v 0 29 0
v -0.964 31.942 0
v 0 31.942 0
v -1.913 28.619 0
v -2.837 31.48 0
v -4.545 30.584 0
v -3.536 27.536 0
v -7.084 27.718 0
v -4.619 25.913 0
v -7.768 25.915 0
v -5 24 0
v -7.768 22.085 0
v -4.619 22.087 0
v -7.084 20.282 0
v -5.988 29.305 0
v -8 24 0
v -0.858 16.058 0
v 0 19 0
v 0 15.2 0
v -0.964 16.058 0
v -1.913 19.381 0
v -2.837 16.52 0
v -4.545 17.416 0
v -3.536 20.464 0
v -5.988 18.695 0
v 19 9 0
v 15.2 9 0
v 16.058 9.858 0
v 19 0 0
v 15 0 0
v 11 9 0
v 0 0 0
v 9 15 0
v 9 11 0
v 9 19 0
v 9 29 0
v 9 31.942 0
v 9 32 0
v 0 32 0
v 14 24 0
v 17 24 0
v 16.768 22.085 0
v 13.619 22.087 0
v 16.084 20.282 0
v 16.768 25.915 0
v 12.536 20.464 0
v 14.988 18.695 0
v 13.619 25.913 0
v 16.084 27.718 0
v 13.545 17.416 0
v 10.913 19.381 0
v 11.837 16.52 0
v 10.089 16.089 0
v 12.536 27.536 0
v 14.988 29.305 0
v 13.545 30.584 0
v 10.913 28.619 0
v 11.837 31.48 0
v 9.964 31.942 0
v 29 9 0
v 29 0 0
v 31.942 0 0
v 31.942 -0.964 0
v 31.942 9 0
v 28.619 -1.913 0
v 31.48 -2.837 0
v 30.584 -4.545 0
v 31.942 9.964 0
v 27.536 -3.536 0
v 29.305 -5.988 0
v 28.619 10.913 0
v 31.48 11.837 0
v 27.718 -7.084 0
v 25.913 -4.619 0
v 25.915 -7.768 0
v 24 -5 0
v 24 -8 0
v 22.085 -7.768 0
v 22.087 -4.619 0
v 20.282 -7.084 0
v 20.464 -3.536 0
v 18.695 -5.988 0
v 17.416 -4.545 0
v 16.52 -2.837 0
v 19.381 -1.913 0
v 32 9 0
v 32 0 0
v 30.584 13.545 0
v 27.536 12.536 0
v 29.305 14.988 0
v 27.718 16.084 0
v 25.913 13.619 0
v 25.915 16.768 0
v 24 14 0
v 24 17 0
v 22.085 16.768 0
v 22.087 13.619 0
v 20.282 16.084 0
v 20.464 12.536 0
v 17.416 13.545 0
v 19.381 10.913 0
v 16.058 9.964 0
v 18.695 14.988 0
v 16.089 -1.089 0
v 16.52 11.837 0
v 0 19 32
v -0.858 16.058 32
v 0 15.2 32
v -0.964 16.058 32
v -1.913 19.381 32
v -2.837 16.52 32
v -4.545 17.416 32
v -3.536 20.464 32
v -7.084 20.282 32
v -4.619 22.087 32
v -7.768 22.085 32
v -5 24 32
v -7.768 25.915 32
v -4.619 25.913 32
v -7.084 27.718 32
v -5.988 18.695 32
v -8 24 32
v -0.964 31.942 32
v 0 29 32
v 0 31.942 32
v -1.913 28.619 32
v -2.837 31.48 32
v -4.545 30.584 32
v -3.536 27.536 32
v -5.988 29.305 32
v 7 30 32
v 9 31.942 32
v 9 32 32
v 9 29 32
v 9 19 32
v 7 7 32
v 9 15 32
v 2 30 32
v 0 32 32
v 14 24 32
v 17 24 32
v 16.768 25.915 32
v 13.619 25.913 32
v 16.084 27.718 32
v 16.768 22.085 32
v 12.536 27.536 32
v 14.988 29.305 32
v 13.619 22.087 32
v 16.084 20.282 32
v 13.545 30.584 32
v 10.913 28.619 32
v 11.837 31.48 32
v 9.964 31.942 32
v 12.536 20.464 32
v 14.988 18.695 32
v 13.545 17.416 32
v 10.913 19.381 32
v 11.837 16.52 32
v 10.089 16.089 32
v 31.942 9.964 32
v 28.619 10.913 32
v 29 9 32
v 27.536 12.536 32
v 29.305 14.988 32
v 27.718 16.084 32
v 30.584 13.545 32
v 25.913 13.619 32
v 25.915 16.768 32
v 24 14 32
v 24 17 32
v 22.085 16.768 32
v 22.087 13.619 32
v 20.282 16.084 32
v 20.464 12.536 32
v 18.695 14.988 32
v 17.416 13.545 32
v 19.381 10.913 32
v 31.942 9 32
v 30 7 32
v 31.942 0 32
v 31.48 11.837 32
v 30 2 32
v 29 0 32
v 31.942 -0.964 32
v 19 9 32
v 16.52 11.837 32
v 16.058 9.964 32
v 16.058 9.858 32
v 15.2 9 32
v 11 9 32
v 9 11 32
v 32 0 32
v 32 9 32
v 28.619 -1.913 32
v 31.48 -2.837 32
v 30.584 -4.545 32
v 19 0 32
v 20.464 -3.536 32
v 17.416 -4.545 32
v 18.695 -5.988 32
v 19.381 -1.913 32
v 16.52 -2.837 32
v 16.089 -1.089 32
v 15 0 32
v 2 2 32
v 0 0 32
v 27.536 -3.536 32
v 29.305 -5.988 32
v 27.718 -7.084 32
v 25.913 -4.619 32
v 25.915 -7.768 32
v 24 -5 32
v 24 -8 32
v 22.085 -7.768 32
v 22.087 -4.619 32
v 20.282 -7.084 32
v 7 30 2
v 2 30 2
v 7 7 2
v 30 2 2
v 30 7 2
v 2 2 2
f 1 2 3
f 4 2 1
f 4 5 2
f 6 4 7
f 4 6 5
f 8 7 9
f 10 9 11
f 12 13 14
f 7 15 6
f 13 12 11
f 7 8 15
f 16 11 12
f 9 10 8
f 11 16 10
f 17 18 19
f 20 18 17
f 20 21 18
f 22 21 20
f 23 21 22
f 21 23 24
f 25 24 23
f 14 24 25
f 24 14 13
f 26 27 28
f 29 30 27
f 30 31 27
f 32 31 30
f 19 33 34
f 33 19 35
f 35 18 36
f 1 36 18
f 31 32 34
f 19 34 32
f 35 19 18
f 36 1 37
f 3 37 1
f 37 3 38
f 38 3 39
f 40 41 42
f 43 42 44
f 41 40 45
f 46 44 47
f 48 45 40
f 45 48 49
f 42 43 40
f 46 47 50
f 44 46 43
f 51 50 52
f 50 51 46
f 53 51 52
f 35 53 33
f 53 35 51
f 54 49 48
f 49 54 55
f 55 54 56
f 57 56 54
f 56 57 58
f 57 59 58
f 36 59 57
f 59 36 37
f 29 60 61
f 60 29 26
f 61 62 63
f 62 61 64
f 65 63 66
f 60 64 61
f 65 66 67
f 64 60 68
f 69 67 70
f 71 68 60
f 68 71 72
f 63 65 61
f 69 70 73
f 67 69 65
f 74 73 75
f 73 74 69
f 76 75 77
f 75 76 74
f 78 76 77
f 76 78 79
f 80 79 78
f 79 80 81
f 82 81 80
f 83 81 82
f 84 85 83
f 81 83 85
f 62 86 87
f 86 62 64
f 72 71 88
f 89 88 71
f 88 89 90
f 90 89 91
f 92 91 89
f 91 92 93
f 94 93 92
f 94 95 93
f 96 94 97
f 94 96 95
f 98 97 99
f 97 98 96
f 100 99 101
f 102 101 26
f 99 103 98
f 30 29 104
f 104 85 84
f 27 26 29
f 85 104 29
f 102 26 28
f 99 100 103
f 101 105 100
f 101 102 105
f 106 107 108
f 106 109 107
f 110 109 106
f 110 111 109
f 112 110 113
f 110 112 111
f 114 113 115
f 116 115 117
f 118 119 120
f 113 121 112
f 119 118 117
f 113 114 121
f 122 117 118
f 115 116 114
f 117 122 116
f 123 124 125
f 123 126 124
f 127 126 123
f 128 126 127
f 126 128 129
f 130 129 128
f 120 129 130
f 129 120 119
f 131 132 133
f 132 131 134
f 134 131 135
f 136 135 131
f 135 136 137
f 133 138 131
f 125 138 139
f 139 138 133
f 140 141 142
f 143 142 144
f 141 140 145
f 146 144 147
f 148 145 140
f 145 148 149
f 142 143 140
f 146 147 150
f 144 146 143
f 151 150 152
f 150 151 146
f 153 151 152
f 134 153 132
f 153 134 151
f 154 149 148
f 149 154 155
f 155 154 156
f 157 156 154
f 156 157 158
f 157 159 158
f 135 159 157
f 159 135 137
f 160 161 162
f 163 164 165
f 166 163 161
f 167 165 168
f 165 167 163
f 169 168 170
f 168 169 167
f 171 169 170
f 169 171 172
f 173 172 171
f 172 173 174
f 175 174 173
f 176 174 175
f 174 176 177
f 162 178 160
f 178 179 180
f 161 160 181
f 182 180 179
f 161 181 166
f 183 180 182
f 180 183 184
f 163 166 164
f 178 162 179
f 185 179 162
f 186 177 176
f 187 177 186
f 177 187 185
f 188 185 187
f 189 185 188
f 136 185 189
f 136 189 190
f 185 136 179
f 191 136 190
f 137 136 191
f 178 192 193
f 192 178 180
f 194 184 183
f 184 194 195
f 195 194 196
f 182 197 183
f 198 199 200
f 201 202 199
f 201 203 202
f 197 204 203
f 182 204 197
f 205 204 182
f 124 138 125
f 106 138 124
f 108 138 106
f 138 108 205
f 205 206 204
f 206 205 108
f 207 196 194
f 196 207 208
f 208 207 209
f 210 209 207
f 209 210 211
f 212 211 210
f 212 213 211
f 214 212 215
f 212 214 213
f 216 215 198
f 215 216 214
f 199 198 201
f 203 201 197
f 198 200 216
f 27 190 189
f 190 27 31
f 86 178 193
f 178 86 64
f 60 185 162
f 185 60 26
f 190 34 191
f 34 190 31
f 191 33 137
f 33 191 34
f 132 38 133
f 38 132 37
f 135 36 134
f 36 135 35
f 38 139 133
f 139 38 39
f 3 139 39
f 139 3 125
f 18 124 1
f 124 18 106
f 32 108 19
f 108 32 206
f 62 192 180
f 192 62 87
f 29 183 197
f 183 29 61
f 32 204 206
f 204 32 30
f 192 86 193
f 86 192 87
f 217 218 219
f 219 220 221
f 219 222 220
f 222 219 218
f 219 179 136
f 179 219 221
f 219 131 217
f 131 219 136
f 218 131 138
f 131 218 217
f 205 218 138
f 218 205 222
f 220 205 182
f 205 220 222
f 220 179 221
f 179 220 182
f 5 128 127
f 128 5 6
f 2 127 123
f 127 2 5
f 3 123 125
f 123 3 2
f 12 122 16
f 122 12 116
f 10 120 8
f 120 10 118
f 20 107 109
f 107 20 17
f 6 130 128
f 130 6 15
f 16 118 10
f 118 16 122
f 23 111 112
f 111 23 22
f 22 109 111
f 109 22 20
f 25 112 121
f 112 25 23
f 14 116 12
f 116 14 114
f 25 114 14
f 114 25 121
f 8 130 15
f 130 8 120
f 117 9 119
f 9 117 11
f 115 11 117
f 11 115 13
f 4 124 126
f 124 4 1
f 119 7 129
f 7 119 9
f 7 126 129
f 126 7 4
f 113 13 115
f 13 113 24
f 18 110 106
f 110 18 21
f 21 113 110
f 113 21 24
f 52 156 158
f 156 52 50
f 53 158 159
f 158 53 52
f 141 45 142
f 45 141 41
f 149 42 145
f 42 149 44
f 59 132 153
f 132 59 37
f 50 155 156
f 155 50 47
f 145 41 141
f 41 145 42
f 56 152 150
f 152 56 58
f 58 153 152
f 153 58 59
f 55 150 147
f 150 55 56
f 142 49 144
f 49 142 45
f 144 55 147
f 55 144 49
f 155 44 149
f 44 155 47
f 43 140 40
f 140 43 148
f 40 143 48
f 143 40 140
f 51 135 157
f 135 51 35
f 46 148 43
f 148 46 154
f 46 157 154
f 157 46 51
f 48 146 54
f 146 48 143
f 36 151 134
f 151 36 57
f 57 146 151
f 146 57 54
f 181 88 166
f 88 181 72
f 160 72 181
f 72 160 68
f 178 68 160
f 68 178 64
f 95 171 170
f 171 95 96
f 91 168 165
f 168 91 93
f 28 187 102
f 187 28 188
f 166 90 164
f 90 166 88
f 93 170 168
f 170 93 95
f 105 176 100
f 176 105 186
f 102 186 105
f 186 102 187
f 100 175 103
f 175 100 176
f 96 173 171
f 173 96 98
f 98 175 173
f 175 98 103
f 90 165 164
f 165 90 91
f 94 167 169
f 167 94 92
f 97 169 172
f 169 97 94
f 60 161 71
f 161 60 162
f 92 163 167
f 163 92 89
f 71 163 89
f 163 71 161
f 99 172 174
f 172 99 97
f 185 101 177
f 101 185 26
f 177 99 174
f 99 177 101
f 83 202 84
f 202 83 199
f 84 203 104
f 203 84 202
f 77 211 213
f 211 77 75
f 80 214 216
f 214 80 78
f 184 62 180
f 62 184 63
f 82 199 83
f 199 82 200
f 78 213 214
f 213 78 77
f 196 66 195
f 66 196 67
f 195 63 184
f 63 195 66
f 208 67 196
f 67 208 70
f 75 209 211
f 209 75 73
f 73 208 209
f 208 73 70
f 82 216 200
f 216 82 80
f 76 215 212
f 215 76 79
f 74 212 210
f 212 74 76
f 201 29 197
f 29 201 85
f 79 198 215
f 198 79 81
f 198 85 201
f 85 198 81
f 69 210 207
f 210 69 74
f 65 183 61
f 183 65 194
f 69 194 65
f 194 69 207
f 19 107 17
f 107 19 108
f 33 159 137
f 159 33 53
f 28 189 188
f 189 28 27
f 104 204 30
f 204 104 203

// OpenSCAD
// Copyright (c) 2015 Richard Hawkins
//
// Licensed under the Apache License, Version 2.0 (the "License");
// you may not use this file except in compliance with the License.
// You may obtain a copy of the License at
//
//    http://www.apache.org/licenses/LICENSE-2.0
//
// Unless required by applicable law or agreed to in writing, software
// distributed under the License is distributed on an "AS IS" BASIS,
// WITHOUT WARRANTIES OR CONDITIONS OF ANY KIND, either express or
// implied.
// See the License for the specific language governing permissions and
// limitations under the License.

// Constants for making adjustments to the feet.
l = 32.0;
w = 9.0;
h = 32.0;
iw = 2.0;

tie_size = 8.0;
tie_wall = 3.0;
tie_height = 4.0;


// TODO: Make the tie-down feet not extend to the bottom of the foot.
// TODO: Make the slot that holds the thrower's foot conform to the shape of the foot.

    
module tie(x=0.0, y=0.0, r=0.0)
{
    
    translate([x, y, 0.0])
    rotate([0.0, 0.0, r])
    difference()
    {
        cylinder(h, tie_size, tie_size);
        translate([0.0, -tie_size, -1.0])
        cube([tie_size, tie_size*2, h+2]);
   
        difference()
        {
            translate([0.0, 0.0, -1.0])
            cylinder(h+2.0, tie_size-tie_wall, tie_size-tie_wall);
        } 
    } 
};

module corner(x=0.0, y=0.0, r=0.0)
{
    translate([x, y, 0.0])
    rotate([0.0, 0.0, r])
    linear_extrude(h, center=false, convexity=10, twist=0)
    polygon(
        [[0,0],
         [0,iw],
         [iw,iw]],
        [[0,1,2,3]]);
}

union() {
// Foot
difference()
{
    linear_extrude(h, center=false, convexity=10, twist=0)
    polygon(
        [[0,0],
         [0,l],
         [w,l],
         [w,w+iw],
         [w+iw,w],
         [l,w],
         [l,0]],
        [[0,1,2,3,4,5,6]]);

    translate([0.0, 0.0, iw])
    linear_extrude(h, center=false, convexity=10, twist=0)
    polygon(
        [[iw,iw],
         [iw,l-iw],
         [w-iw,l-iw],
         [w-iw,w-iw],
         [l-iw,w-iw],
         [l-iw,iw]],
        [[0,1,2,3,4,5]]);
}

// Left tie
tie(x=0.0, y=l-iw*4);
corner(x=-1.0, y=(l/2)+0.2, r=-90);
tie(x=w, y=l-iw*4, r=180);
corner(x=w, y=(l/2)-1.0, r=-0);

// Right tie
tie(x=l-iw*4, y=w, r=-90);
corner(x=l/2.0+0.2, y=w+1.0, r=-180);
tie(x=l-iw*4, y=0, r=90.0);
corner(x=l/2.0-1, y=-0.0, r=-90);
}
